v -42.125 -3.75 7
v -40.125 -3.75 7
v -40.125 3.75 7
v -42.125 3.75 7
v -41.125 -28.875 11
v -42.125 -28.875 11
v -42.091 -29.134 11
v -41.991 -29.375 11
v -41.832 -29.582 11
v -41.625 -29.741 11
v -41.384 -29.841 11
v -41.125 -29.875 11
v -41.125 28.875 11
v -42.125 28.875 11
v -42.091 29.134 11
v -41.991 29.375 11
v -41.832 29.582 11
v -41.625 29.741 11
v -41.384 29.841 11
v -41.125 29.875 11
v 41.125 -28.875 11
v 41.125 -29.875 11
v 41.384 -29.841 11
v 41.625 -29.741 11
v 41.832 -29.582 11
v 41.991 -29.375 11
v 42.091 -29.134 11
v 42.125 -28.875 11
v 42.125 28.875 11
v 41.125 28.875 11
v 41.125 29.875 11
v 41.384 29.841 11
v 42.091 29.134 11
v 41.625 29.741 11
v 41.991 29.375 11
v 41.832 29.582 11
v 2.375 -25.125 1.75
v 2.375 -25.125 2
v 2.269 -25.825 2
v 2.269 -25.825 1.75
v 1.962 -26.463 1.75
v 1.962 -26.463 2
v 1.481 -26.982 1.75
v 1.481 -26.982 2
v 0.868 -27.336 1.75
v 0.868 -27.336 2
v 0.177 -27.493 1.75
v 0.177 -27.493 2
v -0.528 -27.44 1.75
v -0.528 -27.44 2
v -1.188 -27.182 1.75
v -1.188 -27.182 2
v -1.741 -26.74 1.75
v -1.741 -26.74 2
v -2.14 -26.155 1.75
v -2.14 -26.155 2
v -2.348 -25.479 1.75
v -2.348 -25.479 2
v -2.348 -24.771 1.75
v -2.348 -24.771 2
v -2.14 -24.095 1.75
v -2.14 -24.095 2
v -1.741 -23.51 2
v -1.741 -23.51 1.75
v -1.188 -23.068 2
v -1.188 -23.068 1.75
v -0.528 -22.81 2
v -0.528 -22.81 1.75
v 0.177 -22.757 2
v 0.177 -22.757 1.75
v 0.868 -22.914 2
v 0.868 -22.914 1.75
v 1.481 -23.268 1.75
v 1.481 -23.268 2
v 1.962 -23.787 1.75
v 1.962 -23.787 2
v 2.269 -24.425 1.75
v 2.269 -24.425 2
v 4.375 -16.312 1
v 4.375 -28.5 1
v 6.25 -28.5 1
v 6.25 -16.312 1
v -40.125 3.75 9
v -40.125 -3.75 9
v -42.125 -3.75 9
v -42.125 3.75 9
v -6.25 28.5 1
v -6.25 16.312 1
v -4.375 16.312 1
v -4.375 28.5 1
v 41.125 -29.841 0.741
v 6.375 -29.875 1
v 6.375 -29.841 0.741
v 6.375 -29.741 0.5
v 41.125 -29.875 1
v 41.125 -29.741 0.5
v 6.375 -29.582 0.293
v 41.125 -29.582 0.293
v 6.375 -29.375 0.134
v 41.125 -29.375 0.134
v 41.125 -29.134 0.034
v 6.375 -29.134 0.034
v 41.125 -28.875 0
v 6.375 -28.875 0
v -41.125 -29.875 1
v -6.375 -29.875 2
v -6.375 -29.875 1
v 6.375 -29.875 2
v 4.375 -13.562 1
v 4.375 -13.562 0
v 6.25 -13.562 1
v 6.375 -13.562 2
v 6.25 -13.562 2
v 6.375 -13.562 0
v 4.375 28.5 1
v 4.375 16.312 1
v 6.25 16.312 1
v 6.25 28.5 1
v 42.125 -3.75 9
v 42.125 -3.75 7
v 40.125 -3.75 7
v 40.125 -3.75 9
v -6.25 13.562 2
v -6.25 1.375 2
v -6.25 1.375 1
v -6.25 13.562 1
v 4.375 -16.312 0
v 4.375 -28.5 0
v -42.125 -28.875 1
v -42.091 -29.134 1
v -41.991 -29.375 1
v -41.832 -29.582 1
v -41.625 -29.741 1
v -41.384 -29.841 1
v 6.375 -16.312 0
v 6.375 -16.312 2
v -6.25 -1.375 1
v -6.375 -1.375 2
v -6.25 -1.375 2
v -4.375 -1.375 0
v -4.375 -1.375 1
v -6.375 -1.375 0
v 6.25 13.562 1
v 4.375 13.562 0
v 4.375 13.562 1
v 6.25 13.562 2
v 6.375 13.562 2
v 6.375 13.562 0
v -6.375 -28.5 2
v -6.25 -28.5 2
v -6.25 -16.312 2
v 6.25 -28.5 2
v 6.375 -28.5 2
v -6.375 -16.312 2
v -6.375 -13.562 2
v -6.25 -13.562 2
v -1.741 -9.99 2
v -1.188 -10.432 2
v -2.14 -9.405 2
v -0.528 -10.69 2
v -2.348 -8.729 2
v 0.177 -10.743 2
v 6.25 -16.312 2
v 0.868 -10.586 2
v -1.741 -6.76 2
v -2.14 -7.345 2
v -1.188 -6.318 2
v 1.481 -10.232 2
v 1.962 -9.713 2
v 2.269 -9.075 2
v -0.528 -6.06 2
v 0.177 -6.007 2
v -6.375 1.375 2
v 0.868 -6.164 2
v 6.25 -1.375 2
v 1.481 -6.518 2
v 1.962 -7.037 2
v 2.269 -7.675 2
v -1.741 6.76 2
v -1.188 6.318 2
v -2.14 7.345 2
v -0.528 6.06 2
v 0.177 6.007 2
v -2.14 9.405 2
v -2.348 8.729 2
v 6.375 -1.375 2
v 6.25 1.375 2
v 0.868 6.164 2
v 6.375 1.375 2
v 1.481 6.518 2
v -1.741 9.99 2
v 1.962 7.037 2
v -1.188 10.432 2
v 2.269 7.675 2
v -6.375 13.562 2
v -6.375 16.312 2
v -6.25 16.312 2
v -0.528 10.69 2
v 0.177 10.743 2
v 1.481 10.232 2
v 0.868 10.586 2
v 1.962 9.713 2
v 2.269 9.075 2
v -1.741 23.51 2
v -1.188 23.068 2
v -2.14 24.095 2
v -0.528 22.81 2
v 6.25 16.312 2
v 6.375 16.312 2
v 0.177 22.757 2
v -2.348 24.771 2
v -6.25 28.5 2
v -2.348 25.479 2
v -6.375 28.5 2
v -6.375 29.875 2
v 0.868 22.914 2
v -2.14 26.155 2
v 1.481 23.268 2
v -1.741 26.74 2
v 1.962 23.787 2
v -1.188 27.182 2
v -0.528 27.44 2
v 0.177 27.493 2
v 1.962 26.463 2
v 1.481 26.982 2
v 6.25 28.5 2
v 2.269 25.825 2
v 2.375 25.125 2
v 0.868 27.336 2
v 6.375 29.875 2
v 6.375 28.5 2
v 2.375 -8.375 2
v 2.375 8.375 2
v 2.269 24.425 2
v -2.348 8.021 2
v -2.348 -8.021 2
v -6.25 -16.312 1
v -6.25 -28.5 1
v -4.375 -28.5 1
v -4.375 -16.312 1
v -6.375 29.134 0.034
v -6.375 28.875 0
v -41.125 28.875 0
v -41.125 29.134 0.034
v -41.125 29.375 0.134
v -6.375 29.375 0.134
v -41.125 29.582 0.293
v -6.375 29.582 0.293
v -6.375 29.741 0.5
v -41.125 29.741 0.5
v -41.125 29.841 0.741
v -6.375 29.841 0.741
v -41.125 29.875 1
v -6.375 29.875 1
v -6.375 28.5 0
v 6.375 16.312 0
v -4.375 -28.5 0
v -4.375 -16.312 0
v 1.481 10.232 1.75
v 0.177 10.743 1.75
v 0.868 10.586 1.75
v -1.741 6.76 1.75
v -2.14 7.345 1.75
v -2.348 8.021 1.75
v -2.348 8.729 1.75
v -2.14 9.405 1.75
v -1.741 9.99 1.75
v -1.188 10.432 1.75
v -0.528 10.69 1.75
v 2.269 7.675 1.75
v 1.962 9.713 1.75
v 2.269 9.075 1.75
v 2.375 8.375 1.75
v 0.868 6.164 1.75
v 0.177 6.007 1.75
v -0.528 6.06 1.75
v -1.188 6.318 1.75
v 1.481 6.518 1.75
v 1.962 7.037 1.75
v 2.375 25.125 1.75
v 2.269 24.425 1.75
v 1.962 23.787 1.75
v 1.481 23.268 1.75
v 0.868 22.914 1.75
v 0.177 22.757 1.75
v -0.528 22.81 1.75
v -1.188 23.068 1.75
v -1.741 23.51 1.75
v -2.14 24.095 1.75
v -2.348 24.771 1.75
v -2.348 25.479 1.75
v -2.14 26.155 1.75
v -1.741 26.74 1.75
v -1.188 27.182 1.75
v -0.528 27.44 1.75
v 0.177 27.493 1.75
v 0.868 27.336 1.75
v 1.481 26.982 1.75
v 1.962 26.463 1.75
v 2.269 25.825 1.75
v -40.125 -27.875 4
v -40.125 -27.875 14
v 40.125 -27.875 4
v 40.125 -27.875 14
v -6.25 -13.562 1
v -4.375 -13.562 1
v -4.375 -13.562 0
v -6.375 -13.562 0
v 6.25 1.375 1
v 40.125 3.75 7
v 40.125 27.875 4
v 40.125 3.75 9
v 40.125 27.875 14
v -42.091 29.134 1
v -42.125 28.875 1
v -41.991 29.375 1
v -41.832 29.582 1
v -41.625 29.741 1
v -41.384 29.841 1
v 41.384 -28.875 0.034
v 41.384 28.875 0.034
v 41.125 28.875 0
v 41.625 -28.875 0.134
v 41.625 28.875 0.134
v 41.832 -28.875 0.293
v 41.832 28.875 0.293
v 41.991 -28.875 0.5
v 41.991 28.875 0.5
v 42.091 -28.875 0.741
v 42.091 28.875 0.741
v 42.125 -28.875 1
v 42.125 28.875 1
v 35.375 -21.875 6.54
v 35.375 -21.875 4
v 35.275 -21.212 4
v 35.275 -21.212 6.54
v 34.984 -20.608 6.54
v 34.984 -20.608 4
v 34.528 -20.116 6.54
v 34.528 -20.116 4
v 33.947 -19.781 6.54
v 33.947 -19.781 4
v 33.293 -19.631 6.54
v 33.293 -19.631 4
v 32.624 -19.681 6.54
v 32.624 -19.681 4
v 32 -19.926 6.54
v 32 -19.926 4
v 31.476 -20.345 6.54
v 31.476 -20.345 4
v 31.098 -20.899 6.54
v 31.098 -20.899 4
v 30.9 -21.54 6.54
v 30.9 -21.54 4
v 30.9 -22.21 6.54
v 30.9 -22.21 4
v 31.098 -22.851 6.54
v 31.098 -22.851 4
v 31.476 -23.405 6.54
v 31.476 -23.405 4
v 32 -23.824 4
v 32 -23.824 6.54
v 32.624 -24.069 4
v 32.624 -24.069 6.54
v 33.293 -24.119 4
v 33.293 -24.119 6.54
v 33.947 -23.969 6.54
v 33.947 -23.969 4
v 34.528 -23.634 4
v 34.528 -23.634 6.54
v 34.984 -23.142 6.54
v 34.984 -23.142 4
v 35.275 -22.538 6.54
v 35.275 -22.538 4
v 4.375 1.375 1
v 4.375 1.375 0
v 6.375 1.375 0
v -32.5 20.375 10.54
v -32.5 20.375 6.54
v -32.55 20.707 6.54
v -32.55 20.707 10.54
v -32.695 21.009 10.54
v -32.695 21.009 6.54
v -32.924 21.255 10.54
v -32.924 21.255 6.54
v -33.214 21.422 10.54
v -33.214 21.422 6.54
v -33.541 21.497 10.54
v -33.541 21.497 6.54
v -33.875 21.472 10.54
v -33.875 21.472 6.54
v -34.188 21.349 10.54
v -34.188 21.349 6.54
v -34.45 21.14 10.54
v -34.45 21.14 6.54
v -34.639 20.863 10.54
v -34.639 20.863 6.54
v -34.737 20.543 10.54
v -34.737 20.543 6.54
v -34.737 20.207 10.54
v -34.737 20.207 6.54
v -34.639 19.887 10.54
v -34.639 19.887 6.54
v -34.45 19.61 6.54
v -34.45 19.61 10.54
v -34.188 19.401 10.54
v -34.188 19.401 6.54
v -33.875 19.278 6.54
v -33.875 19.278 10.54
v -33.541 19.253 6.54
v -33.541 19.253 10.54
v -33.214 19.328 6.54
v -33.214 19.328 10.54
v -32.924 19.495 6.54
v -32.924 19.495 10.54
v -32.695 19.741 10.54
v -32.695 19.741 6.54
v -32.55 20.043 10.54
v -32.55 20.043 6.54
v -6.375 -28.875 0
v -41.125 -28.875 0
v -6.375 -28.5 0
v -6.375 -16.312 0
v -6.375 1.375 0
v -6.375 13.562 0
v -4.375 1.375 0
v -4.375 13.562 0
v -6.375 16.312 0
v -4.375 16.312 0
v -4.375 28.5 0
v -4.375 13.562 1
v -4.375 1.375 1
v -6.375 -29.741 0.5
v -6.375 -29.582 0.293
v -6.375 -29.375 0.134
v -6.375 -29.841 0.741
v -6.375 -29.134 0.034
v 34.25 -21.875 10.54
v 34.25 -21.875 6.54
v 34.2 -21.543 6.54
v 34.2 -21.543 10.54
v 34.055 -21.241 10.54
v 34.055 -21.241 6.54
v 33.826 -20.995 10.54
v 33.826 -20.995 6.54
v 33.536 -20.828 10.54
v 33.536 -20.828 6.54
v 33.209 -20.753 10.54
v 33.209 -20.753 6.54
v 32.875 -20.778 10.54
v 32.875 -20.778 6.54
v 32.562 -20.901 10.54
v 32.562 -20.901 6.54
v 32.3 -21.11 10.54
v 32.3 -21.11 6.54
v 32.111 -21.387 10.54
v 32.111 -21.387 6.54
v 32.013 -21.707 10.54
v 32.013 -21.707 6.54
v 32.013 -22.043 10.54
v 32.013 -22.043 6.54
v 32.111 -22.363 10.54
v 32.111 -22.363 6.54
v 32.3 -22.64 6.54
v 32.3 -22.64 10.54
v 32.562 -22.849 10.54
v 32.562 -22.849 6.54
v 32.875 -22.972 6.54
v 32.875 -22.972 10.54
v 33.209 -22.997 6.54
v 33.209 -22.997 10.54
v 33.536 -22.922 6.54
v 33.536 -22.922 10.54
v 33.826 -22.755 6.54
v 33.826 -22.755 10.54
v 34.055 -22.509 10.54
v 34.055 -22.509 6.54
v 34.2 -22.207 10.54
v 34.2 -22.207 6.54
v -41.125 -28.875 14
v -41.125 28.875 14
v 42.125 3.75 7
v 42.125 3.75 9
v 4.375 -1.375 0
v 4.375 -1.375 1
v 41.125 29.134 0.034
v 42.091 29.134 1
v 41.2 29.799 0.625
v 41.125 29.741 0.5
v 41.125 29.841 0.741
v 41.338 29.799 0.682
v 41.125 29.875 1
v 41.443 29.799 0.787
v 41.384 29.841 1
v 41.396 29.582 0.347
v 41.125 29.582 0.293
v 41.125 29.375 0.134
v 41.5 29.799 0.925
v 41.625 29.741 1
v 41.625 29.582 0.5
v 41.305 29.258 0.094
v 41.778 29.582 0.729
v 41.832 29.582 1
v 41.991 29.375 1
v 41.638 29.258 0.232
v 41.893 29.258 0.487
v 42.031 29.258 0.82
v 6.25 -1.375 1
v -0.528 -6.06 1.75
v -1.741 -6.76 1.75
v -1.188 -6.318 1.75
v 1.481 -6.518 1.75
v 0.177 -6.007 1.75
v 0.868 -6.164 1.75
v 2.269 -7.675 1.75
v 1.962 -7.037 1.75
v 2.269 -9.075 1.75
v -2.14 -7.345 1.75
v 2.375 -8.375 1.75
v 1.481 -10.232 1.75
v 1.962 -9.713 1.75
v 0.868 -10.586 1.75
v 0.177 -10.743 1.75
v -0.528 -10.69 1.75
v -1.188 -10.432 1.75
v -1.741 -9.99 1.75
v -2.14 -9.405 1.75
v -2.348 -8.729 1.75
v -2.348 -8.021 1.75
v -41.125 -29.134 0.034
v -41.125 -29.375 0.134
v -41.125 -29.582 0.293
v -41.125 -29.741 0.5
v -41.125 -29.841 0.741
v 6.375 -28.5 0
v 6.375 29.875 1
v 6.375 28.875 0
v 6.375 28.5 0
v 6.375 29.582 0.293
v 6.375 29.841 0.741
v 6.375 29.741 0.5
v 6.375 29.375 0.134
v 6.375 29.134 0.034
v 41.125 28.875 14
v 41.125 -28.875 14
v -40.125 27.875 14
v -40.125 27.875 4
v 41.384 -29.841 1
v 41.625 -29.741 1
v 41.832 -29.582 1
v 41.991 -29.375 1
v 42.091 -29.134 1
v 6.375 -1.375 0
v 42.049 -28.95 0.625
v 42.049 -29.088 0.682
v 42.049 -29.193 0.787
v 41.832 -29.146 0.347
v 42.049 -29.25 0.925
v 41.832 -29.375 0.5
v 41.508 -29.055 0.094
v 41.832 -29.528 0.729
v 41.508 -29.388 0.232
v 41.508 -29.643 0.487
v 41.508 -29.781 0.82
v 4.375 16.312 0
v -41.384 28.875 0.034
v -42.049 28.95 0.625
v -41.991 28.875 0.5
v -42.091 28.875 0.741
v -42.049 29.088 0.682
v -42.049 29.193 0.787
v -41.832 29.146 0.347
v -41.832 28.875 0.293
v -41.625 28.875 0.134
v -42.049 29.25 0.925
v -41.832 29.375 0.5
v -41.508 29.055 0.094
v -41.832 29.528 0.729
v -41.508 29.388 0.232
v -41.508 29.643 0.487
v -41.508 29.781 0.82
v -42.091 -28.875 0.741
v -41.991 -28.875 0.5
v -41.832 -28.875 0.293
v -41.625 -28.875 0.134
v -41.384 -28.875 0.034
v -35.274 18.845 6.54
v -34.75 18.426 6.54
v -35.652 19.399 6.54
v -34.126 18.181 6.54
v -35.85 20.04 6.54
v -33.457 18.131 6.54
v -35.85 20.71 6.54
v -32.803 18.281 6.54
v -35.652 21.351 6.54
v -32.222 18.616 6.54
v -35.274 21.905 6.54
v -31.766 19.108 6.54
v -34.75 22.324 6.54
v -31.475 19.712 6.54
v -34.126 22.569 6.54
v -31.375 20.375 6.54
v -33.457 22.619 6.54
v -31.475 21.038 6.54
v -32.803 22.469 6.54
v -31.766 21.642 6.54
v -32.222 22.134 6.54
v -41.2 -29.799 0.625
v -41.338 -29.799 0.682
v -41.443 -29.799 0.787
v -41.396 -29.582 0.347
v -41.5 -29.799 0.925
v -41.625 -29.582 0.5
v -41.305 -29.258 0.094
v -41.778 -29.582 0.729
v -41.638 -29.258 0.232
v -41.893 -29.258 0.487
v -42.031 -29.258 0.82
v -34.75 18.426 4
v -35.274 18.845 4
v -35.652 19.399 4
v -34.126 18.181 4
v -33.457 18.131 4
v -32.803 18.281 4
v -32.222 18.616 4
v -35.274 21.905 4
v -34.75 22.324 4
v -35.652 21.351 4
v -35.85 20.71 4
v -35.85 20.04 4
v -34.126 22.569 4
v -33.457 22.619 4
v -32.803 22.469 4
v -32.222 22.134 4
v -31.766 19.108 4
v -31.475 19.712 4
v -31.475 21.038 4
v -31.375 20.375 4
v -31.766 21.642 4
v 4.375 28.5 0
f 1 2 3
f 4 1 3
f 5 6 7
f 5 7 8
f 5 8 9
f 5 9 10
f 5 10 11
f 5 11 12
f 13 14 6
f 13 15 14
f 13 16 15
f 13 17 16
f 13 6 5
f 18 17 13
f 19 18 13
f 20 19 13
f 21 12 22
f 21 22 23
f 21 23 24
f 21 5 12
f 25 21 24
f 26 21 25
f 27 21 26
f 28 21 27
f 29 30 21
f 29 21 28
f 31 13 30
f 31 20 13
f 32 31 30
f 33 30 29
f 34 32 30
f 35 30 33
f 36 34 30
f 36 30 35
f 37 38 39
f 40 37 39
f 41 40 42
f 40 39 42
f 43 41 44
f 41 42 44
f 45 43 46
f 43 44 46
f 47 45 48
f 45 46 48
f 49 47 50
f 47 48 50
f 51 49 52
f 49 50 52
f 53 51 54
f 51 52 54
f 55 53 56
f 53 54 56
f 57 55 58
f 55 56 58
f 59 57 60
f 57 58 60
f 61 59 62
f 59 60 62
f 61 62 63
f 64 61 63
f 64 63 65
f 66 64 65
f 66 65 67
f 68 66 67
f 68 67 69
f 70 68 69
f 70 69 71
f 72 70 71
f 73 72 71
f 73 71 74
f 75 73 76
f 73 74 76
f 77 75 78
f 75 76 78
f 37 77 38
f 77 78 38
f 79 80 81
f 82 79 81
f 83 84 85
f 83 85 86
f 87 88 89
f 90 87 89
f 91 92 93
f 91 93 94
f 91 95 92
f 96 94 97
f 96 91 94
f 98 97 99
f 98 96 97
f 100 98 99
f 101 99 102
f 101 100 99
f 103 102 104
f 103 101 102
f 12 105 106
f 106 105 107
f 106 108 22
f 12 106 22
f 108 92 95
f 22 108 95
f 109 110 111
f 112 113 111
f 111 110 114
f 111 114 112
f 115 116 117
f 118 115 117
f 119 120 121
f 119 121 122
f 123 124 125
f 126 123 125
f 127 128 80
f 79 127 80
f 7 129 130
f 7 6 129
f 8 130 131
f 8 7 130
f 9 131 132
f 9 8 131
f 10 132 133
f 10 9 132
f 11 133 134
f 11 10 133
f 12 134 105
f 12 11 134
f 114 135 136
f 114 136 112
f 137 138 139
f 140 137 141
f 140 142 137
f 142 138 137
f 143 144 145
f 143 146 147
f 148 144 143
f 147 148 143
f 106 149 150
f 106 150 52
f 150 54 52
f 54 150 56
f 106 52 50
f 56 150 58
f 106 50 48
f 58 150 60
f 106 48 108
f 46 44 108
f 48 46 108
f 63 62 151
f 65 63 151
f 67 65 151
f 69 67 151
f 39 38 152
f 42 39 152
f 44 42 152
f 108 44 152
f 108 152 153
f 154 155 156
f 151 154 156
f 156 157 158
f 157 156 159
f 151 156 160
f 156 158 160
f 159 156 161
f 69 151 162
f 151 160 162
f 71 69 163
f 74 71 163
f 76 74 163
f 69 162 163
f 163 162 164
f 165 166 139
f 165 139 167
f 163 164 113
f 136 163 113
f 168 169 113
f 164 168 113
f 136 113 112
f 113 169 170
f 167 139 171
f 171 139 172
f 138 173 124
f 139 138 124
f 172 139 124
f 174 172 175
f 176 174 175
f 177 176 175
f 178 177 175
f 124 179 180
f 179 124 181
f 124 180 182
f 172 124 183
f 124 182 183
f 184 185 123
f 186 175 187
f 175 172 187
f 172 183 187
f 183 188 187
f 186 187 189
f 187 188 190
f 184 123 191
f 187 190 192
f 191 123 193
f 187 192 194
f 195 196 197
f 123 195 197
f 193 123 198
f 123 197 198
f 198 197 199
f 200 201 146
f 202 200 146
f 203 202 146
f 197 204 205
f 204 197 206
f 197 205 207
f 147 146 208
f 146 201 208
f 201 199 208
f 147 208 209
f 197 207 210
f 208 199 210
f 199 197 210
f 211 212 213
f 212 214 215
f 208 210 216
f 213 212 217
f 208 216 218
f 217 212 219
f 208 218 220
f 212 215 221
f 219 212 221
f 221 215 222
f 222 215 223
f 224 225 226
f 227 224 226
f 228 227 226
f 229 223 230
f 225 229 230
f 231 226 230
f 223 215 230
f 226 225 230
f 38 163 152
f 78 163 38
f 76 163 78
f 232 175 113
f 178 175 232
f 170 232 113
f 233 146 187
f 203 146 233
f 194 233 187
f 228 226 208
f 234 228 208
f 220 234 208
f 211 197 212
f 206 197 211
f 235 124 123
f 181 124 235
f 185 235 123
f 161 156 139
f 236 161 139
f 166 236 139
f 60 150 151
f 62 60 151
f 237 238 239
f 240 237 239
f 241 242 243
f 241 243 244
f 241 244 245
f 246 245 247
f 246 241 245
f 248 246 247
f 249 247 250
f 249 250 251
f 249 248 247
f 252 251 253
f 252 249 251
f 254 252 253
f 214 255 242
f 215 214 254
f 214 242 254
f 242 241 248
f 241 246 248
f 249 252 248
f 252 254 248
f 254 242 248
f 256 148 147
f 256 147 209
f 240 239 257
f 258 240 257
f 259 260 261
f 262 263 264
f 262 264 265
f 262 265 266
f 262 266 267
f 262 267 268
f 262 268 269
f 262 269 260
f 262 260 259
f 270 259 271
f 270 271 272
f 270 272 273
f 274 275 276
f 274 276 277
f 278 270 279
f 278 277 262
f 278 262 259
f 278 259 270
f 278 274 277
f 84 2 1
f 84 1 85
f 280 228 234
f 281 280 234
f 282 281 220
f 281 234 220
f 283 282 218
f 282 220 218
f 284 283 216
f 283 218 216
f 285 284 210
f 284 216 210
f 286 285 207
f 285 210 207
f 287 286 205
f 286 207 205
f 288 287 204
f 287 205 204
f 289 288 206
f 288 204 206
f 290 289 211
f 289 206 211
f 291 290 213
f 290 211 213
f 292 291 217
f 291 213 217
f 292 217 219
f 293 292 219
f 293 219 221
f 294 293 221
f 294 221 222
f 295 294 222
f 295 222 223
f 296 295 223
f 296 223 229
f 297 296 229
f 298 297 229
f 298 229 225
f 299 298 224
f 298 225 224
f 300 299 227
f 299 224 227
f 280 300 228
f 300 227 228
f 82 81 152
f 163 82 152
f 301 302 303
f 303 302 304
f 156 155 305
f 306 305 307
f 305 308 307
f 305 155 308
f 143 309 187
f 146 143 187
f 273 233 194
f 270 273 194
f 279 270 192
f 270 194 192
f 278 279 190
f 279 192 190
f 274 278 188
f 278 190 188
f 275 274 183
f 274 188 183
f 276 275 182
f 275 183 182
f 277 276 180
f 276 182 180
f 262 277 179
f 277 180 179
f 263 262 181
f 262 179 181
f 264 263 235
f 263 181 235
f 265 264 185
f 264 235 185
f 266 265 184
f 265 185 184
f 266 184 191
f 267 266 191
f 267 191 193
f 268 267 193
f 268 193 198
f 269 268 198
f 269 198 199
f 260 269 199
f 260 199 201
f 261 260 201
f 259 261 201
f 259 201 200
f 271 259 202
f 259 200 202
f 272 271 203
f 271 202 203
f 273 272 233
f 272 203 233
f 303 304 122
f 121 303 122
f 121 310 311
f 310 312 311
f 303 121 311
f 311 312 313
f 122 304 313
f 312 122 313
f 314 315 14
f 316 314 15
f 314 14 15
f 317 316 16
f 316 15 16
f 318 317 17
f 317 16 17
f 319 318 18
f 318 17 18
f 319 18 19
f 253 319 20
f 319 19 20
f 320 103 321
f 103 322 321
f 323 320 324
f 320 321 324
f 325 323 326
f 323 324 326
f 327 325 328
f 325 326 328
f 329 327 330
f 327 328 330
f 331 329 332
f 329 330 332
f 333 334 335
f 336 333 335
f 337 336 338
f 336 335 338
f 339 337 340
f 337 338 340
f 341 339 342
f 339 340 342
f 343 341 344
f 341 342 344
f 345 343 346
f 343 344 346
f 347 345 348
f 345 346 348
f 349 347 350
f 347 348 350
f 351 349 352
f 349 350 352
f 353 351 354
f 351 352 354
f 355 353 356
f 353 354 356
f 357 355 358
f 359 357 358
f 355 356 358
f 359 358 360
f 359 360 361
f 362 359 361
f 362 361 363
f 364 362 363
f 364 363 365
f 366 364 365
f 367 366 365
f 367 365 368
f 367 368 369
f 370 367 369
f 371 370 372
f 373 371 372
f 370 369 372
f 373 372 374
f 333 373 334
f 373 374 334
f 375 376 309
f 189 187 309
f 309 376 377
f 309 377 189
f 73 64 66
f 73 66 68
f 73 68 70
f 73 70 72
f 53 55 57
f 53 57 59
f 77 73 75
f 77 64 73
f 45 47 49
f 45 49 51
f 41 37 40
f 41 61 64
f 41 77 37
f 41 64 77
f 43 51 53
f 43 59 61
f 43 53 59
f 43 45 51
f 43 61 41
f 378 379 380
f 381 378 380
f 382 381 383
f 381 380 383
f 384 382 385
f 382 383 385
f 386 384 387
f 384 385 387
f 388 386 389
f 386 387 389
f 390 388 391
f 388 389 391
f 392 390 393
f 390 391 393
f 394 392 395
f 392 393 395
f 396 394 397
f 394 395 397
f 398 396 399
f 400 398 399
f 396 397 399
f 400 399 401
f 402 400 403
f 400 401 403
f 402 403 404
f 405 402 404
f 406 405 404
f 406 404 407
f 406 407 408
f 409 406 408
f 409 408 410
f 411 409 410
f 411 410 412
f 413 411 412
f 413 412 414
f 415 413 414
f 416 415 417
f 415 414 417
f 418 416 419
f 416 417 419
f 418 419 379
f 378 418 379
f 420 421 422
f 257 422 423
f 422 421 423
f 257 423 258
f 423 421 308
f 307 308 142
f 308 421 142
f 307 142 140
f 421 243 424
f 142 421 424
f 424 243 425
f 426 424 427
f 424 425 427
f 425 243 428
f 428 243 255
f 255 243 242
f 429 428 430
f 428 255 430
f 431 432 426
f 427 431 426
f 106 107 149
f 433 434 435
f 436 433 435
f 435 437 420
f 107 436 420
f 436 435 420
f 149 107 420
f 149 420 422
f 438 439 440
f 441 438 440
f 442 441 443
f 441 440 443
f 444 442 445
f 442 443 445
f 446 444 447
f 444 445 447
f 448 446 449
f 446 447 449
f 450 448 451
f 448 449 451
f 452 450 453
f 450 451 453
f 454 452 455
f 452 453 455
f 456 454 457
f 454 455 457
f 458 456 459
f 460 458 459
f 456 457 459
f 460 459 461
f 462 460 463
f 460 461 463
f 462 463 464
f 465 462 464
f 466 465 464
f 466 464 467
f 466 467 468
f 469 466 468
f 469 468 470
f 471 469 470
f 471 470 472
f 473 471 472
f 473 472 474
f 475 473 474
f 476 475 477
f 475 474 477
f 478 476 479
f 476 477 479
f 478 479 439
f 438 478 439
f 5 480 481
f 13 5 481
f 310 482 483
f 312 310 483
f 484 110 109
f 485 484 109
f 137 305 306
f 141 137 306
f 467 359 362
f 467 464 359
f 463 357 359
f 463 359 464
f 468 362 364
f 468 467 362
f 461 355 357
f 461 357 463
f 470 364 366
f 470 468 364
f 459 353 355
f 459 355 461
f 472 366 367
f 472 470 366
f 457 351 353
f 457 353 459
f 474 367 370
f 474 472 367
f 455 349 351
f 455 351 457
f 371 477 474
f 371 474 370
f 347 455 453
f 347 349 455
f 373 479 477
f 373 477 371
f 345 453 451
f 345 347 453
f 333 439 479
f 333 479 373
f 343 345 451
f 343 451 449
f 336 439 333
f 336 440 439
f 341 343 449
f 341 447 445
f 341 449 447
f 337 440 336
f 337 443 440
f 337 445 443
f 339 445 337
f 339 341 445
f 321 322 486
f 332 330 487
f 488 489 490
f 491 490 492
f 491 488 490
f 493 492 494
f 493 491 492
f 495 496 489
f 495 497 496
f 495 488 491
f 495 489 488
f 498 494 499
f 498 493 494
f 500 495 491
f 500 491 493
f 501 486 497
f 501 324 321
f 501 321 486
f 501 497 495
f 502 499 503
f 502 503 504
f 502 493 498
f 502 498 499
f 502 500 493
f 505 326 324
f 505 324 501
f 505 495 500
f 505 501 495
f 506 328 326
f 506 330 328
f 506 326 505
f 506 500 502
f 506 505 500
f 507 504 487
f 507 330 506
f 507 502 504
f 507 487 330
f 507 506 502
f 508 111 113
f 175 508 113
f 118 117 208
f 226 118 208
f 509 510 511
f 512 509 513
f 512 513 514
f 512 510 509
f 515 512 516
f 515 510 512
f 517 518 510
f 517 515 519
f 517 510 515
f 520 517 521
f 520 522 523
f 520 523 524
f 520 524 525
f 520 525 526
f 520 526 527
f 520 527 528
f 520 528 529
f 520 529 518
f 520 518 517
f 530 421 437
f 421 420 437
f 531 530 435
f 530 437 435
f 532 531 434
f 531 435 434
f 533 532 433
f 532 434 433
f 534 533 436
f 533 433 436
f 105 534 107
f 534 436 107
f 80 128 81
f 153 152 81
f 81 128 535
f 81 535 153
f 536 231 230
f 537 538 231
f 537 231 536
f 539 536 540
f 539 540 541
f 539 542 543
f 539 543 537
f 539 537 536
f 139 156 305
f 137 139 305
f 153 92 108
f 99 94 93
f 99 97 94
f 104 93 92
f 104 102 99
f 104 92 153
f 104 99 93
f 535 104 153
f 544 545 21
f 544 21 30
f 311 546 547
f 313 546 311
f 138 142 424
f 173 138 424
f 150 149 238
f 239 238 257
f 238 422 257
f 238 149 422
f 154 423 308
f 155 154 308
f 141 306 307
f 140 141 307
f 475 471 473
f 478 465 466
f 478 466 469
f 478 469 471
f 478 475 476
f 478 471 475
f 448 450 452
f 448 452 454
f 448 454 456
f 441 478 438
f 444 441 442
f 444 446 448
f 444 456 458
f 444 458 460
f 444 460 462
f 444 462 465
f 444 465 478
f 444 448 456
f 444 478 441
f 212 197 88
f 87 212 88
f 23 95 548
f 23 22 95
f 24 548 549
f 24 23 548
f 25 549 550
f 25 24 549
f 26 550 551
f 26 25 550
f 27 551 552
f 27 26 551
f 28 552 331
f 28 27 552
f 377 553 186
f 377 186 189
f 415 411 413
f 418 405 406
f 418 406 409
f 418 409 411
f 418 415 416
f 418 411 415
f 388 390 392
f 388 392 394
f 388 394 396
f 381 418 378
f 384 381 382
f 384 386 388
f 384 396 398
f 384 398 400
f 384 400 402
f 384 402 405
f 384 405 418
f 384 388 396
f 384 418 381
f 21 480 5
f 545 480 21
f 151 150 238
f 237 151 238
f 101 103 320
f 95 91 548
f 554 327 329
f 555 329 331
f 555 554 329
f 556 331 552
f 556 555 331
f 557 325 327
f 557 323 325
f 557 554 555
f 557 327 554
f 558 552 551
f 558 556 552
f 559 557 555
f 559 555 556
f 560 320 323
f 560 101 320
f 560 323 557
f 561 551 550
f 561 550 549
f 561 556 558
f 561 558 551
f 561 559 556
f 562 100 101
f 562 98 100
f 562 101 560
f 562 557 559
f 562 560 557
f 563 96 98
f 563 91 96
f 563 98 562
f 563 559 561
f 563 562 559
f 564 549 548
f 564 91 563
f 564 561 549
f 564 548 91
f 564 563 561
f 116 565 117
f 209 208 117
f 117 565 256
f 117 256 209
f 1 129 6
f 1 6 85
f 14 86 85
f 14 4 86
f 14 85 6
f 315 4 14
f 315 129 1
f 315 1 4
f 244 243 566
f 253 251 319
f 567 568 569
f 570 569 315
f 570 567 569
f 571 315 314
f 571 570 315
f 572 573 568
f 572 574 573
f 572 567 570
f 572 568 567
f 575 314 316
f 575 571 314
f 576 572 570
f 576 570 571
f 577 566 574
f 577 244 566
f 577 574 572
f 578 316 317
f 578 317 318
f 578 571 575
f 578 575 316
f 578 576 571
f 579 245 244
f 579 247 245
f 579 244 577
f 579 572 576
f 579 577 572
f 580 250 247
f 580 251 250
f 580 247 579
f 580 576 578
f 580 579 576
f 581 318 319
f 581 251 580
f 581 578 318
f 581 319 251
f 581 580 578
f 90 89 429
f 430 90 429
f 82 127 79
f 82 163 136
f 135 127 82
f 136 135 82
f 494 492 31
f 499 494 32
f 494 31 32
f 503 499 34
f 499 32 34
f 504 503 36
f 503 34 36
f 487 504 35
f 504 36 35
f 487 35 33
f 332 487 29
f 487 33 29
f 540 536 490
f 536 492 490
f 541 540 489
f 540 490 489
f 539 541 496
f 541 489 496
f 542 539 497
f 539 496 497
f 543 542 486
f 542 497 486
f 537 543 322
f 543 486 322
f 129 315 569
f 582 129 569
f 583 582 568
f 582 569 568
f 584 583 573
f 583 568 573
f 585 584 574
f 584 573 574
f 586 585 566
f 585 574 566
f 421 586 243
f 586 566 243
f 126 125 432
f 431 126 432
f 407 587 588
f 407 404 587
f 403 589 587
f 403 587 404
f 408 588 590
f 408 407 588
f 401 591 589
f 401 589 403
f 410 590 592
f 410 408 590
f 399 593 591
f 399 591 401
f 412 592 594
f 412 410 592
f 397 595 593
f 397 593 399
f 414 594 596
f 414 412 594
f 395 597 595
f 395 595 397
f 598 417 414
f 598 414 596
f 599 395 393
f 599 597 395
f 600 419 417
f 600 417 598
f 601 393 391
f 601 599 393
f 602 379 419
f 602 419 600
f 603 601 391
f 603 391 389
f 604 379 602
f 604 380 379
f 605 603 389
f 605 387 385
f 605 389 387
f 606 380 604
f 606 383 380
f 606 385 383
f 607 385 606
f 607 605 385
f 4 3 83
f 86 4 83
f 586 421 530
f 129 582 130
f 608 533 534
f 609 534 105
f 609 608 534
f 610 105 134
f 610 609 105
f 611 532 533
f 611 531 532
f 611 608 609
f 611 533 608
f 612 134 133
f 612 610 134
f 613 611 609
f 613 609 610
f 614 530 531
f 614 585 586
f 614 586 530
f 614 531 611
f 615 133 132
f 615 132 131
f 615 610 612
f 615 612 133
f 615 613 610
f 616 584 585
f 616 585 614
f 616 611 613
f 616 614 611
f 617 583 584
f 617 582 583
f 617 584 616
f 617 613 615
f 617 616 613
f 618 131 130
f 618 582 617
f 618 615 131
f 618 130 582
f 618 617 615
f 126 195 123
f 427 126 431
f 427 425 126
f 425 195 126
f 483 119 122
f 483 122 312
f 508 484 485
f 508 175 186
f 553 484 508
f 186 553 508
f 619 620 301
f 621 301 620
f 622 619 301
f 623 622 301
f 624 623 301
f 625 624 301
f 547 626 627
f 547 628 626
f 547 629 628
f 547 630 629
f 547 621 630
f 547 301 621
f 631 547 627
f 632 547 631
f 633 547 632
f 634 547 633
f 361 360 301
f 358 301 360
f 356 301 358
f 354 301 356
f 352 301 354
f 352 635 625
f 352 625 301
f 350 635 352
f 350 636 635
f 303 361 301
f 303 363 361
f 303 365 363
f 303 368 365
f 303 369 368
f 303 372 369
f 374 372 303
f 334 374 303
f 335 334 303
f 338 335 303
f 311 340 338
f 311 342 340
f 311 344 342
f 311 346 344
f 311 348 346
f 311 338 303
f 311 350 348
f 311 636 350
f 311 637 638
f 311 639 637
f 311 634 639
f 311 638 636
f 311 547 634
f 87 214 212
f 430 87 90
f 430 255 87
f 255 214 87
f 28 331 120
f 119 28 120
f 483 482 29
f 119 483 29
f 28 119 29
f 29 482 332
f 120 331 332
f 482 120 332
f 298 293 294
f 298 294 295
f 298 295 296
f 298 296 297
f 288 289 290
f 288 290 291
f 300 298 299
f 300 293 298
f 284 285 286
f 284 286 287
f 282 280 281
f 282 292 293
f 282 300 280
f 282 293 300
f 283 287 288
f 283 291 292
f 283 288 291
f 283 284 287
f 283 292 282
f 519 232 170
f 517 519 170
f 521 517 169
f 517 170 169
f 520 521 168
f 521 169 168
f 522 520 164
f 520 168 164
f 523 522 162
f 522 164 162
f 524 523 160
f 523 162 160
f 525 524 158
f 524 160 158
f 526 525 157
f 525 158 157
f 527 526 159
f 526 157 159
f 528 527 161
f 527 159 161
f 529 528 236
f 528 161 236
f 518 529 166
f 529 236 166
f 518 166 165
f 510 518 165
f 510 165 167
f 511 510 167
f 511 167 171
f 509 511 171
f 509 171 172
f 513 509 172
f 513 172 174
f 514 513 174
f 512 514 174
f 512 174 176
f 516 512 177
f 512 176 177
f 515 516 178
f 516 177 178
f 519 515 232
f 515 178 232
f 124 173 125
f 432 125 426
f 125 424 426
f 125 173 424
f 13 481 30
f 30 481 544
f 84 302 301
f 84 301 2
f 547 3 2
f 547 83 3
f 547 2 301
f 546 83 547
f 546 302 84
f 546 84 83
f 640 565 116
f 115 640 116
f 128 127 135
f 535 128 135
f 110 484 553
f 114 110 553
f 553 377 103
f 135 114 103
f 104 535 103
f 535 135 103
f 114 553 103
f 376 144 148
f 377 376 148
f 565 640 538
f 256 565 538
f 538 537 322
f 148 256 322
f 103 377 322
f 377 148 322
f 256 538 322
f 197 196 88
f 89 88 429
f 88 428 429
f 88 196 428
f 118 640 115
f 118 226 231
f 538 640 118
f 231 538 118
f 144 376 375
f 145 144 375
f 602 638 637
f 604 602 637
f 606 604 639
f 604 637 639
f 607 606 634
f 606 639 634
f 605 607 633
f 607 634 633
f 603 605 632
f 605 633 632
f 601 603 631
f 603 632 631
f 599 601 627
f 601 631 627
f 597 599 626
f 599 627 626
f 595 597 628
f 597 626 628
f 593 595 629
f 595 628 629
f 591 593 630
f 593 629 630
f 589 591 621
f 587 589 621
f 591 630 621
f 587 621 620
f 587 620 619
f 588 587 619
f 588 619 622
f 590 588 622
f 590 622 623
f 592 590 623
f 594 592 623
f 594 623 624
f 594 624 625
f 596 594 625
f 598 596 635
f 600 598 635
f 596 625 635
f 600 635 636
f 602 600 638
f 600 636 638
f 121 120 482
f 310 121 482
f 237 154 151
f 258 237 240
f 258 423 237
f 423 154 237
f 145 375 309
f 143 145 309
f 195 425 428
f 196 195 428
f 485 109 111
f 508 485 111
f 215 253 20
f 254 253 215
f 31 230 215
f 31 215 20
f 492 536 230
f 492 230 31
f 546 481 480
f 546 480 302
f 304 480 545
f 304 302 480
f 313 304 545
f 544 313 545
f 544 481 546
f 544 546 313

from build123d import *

# Parameters (mm, degrees)
F0_W      = 84.25
F0_H      = 59.75
F0_W_2    = 76.25
F0_H_2    = 51.75
F1_DEPTH  = 14
F2_W      = 80.25
F2_H      = 55.75
F3_DEPTH  = 10
F5_DEPTH  = 62
F6_W      = 12.75
F6_H      = 2.75
F7_DEPTH  = 2
F8_R      = 2.375
F9_DEPTH  = 0.25
F10_W     = 84.25
F10_H     = 59.75
F10_W_2   = 82.25
F10_H_2   = 57.75
F11_DEPTH = 3
F12_W     = 7.5
F12_H     = 2
F13_DEPTH = 85
F14_R     = 1
F15_R     = 2.25
F16_DEPTH = 2.54
F17_R     = 1.125
F18_DEPTH = 4
F19_DEPTH = 2.54
F20_R     = 1.125
F21_DEPTH = 4


with BuildPart() as f1:
    # F0 (on Top) → F1 (new body)
    with BuildSketch(Plane.XY):
        Rectangle(F0_W, F0_H)
        Rectangle(F0_W_2, F0_H_2, mode=Mode.SUBTRACT)
        Rectangle(F0_W_2, F0_H_2)
    extrude(amount=F1_DEPTH)

    # F2 (on face) → F3 (cut)
    with BuildSketch(Plane.XY.offset(14)):
        Rectangle(F2_W, F2_H)
    extrude(amount=-F3_DEPTH, mode=Mode.SUBTRACT)

    # F4 (on face) → F5 (cut)
    with BuildSketch(Plane.XZ.offset(29.875)):
        Polygon((-4.375, 0), (0, 0), (0, 2), (-6.25, 2), (-6.25, 1), (-4.375, 1), align=None)
        Polygon((0, 2), (0, 0), (4.375, 0), (4.375, 1), (6.25, 1), (6.25, 2), align=None)
    extrude(amount=-F5_DEPTH, mode=Mode.SUBTRACT)

    # F6 (on Top) → F7 (cut)
    with BuildSketch(Plane.XY):
        with Locations((0, 29.875)):
            Rectangle(F6_W, F6_H)
        with Locations((0, 14.9375)):
            Rectangle(F6_W, F6_H)
        Rectangle(F6_W, F6_H)
        with Locations((0, -14.9375)):
            Rectangle(F6_W, F6_H)
        with Locations((0, -29.875)):
            Rectangle(F6_W, F6_H)
    extrude(amount=F7_DEPTH, mode=Mode.SUBTRACT)

    # F8 (on face) → F9 (join)
    with BuildSketch(Plane(origin=(0, 0, 2), x_dir=(1, 0, 0), z_dir=(0, 0, -1))):
        with Locations((0, 25.125)):
            Circle(F8_R)
        with Locations((0, 8.375)):
            Circle(F8_R)
        with Locations((0, -8.375)):
            Circle(F8_R)
        with Locations((0, -25.125)):
            Circle(F8_R)
    extrude(amount=F9_DEPTH)

    # F10 (on face) → F11 (cut)
    with BuildSketch(Plane.XY.offset(14)):
        Rectangle(F10_W, F10_H)
        Rectangle(F10_W_2, F10_H_2, mode=Mode.SUBTRACT)
    extrude(amount=-F11_DEPTH, mode=Mode.SUBTRACT)

    # F12 (on face) → F13 (cut)
    with BuildSketch(Plane.YZ.offset(42.125)):
        with Locations((0, 8)):
            Rectangle(F12_W, F12_H)
    extrude(amount=-F13_DEPTH, mode=Mode.SUBTRACT)

    # F14
    f14_edges = [f1.edges().sort_by_distance(p)[0] for p in [
        (24.25, -29.875, 0),
        (42.125, 0, 0),
        (24.25, 29.875, 0),
        (-24.25, 29.875, 0),
        (-42.125, 0, 0),
        (-24.25, -29.875, 0),
        (42.125, -29.875, 5.5),
        (42.125, 29.875, 5.5),
        (-42.125, -29.875, 5.5),
        (-42.125, 29.875, 5.5),
    ]]
    fillet(f14_edges, radius=F14_R)

    # F15 (on face) → F16 (join)
    with BuildSketch(Plane.XY.offset(4)):
        with Locations((-33.625, 20.375)):
            Circle(F15_R)
    extrude(amount=F16_DEPTH)

    # F17 (on face) → F18 (join)
    with BuildSketch(Plane.XY.offset(6.54)):
        with Locations((-33.625, 20.375)):
            Circle(F17_R)
    extrude(amount=F18_DEPTH)

    # F15 (on face) → F19 (join)
    with BuildSketch(Plane.XY.offset(4)):
        with Locations((33.125, -21.875)):
            Circle(F15_R)
    extrude(amount=F19_DEPTH)

    # F20 (on face) → F21 (join)
    with BuildSketch(Plane.XY.offset(6.54)):
        with Locations((33.125, -21.875)):
            Circle(F20_R)
    extrude(amount=F21_DEPTH)


solid = f1.part
